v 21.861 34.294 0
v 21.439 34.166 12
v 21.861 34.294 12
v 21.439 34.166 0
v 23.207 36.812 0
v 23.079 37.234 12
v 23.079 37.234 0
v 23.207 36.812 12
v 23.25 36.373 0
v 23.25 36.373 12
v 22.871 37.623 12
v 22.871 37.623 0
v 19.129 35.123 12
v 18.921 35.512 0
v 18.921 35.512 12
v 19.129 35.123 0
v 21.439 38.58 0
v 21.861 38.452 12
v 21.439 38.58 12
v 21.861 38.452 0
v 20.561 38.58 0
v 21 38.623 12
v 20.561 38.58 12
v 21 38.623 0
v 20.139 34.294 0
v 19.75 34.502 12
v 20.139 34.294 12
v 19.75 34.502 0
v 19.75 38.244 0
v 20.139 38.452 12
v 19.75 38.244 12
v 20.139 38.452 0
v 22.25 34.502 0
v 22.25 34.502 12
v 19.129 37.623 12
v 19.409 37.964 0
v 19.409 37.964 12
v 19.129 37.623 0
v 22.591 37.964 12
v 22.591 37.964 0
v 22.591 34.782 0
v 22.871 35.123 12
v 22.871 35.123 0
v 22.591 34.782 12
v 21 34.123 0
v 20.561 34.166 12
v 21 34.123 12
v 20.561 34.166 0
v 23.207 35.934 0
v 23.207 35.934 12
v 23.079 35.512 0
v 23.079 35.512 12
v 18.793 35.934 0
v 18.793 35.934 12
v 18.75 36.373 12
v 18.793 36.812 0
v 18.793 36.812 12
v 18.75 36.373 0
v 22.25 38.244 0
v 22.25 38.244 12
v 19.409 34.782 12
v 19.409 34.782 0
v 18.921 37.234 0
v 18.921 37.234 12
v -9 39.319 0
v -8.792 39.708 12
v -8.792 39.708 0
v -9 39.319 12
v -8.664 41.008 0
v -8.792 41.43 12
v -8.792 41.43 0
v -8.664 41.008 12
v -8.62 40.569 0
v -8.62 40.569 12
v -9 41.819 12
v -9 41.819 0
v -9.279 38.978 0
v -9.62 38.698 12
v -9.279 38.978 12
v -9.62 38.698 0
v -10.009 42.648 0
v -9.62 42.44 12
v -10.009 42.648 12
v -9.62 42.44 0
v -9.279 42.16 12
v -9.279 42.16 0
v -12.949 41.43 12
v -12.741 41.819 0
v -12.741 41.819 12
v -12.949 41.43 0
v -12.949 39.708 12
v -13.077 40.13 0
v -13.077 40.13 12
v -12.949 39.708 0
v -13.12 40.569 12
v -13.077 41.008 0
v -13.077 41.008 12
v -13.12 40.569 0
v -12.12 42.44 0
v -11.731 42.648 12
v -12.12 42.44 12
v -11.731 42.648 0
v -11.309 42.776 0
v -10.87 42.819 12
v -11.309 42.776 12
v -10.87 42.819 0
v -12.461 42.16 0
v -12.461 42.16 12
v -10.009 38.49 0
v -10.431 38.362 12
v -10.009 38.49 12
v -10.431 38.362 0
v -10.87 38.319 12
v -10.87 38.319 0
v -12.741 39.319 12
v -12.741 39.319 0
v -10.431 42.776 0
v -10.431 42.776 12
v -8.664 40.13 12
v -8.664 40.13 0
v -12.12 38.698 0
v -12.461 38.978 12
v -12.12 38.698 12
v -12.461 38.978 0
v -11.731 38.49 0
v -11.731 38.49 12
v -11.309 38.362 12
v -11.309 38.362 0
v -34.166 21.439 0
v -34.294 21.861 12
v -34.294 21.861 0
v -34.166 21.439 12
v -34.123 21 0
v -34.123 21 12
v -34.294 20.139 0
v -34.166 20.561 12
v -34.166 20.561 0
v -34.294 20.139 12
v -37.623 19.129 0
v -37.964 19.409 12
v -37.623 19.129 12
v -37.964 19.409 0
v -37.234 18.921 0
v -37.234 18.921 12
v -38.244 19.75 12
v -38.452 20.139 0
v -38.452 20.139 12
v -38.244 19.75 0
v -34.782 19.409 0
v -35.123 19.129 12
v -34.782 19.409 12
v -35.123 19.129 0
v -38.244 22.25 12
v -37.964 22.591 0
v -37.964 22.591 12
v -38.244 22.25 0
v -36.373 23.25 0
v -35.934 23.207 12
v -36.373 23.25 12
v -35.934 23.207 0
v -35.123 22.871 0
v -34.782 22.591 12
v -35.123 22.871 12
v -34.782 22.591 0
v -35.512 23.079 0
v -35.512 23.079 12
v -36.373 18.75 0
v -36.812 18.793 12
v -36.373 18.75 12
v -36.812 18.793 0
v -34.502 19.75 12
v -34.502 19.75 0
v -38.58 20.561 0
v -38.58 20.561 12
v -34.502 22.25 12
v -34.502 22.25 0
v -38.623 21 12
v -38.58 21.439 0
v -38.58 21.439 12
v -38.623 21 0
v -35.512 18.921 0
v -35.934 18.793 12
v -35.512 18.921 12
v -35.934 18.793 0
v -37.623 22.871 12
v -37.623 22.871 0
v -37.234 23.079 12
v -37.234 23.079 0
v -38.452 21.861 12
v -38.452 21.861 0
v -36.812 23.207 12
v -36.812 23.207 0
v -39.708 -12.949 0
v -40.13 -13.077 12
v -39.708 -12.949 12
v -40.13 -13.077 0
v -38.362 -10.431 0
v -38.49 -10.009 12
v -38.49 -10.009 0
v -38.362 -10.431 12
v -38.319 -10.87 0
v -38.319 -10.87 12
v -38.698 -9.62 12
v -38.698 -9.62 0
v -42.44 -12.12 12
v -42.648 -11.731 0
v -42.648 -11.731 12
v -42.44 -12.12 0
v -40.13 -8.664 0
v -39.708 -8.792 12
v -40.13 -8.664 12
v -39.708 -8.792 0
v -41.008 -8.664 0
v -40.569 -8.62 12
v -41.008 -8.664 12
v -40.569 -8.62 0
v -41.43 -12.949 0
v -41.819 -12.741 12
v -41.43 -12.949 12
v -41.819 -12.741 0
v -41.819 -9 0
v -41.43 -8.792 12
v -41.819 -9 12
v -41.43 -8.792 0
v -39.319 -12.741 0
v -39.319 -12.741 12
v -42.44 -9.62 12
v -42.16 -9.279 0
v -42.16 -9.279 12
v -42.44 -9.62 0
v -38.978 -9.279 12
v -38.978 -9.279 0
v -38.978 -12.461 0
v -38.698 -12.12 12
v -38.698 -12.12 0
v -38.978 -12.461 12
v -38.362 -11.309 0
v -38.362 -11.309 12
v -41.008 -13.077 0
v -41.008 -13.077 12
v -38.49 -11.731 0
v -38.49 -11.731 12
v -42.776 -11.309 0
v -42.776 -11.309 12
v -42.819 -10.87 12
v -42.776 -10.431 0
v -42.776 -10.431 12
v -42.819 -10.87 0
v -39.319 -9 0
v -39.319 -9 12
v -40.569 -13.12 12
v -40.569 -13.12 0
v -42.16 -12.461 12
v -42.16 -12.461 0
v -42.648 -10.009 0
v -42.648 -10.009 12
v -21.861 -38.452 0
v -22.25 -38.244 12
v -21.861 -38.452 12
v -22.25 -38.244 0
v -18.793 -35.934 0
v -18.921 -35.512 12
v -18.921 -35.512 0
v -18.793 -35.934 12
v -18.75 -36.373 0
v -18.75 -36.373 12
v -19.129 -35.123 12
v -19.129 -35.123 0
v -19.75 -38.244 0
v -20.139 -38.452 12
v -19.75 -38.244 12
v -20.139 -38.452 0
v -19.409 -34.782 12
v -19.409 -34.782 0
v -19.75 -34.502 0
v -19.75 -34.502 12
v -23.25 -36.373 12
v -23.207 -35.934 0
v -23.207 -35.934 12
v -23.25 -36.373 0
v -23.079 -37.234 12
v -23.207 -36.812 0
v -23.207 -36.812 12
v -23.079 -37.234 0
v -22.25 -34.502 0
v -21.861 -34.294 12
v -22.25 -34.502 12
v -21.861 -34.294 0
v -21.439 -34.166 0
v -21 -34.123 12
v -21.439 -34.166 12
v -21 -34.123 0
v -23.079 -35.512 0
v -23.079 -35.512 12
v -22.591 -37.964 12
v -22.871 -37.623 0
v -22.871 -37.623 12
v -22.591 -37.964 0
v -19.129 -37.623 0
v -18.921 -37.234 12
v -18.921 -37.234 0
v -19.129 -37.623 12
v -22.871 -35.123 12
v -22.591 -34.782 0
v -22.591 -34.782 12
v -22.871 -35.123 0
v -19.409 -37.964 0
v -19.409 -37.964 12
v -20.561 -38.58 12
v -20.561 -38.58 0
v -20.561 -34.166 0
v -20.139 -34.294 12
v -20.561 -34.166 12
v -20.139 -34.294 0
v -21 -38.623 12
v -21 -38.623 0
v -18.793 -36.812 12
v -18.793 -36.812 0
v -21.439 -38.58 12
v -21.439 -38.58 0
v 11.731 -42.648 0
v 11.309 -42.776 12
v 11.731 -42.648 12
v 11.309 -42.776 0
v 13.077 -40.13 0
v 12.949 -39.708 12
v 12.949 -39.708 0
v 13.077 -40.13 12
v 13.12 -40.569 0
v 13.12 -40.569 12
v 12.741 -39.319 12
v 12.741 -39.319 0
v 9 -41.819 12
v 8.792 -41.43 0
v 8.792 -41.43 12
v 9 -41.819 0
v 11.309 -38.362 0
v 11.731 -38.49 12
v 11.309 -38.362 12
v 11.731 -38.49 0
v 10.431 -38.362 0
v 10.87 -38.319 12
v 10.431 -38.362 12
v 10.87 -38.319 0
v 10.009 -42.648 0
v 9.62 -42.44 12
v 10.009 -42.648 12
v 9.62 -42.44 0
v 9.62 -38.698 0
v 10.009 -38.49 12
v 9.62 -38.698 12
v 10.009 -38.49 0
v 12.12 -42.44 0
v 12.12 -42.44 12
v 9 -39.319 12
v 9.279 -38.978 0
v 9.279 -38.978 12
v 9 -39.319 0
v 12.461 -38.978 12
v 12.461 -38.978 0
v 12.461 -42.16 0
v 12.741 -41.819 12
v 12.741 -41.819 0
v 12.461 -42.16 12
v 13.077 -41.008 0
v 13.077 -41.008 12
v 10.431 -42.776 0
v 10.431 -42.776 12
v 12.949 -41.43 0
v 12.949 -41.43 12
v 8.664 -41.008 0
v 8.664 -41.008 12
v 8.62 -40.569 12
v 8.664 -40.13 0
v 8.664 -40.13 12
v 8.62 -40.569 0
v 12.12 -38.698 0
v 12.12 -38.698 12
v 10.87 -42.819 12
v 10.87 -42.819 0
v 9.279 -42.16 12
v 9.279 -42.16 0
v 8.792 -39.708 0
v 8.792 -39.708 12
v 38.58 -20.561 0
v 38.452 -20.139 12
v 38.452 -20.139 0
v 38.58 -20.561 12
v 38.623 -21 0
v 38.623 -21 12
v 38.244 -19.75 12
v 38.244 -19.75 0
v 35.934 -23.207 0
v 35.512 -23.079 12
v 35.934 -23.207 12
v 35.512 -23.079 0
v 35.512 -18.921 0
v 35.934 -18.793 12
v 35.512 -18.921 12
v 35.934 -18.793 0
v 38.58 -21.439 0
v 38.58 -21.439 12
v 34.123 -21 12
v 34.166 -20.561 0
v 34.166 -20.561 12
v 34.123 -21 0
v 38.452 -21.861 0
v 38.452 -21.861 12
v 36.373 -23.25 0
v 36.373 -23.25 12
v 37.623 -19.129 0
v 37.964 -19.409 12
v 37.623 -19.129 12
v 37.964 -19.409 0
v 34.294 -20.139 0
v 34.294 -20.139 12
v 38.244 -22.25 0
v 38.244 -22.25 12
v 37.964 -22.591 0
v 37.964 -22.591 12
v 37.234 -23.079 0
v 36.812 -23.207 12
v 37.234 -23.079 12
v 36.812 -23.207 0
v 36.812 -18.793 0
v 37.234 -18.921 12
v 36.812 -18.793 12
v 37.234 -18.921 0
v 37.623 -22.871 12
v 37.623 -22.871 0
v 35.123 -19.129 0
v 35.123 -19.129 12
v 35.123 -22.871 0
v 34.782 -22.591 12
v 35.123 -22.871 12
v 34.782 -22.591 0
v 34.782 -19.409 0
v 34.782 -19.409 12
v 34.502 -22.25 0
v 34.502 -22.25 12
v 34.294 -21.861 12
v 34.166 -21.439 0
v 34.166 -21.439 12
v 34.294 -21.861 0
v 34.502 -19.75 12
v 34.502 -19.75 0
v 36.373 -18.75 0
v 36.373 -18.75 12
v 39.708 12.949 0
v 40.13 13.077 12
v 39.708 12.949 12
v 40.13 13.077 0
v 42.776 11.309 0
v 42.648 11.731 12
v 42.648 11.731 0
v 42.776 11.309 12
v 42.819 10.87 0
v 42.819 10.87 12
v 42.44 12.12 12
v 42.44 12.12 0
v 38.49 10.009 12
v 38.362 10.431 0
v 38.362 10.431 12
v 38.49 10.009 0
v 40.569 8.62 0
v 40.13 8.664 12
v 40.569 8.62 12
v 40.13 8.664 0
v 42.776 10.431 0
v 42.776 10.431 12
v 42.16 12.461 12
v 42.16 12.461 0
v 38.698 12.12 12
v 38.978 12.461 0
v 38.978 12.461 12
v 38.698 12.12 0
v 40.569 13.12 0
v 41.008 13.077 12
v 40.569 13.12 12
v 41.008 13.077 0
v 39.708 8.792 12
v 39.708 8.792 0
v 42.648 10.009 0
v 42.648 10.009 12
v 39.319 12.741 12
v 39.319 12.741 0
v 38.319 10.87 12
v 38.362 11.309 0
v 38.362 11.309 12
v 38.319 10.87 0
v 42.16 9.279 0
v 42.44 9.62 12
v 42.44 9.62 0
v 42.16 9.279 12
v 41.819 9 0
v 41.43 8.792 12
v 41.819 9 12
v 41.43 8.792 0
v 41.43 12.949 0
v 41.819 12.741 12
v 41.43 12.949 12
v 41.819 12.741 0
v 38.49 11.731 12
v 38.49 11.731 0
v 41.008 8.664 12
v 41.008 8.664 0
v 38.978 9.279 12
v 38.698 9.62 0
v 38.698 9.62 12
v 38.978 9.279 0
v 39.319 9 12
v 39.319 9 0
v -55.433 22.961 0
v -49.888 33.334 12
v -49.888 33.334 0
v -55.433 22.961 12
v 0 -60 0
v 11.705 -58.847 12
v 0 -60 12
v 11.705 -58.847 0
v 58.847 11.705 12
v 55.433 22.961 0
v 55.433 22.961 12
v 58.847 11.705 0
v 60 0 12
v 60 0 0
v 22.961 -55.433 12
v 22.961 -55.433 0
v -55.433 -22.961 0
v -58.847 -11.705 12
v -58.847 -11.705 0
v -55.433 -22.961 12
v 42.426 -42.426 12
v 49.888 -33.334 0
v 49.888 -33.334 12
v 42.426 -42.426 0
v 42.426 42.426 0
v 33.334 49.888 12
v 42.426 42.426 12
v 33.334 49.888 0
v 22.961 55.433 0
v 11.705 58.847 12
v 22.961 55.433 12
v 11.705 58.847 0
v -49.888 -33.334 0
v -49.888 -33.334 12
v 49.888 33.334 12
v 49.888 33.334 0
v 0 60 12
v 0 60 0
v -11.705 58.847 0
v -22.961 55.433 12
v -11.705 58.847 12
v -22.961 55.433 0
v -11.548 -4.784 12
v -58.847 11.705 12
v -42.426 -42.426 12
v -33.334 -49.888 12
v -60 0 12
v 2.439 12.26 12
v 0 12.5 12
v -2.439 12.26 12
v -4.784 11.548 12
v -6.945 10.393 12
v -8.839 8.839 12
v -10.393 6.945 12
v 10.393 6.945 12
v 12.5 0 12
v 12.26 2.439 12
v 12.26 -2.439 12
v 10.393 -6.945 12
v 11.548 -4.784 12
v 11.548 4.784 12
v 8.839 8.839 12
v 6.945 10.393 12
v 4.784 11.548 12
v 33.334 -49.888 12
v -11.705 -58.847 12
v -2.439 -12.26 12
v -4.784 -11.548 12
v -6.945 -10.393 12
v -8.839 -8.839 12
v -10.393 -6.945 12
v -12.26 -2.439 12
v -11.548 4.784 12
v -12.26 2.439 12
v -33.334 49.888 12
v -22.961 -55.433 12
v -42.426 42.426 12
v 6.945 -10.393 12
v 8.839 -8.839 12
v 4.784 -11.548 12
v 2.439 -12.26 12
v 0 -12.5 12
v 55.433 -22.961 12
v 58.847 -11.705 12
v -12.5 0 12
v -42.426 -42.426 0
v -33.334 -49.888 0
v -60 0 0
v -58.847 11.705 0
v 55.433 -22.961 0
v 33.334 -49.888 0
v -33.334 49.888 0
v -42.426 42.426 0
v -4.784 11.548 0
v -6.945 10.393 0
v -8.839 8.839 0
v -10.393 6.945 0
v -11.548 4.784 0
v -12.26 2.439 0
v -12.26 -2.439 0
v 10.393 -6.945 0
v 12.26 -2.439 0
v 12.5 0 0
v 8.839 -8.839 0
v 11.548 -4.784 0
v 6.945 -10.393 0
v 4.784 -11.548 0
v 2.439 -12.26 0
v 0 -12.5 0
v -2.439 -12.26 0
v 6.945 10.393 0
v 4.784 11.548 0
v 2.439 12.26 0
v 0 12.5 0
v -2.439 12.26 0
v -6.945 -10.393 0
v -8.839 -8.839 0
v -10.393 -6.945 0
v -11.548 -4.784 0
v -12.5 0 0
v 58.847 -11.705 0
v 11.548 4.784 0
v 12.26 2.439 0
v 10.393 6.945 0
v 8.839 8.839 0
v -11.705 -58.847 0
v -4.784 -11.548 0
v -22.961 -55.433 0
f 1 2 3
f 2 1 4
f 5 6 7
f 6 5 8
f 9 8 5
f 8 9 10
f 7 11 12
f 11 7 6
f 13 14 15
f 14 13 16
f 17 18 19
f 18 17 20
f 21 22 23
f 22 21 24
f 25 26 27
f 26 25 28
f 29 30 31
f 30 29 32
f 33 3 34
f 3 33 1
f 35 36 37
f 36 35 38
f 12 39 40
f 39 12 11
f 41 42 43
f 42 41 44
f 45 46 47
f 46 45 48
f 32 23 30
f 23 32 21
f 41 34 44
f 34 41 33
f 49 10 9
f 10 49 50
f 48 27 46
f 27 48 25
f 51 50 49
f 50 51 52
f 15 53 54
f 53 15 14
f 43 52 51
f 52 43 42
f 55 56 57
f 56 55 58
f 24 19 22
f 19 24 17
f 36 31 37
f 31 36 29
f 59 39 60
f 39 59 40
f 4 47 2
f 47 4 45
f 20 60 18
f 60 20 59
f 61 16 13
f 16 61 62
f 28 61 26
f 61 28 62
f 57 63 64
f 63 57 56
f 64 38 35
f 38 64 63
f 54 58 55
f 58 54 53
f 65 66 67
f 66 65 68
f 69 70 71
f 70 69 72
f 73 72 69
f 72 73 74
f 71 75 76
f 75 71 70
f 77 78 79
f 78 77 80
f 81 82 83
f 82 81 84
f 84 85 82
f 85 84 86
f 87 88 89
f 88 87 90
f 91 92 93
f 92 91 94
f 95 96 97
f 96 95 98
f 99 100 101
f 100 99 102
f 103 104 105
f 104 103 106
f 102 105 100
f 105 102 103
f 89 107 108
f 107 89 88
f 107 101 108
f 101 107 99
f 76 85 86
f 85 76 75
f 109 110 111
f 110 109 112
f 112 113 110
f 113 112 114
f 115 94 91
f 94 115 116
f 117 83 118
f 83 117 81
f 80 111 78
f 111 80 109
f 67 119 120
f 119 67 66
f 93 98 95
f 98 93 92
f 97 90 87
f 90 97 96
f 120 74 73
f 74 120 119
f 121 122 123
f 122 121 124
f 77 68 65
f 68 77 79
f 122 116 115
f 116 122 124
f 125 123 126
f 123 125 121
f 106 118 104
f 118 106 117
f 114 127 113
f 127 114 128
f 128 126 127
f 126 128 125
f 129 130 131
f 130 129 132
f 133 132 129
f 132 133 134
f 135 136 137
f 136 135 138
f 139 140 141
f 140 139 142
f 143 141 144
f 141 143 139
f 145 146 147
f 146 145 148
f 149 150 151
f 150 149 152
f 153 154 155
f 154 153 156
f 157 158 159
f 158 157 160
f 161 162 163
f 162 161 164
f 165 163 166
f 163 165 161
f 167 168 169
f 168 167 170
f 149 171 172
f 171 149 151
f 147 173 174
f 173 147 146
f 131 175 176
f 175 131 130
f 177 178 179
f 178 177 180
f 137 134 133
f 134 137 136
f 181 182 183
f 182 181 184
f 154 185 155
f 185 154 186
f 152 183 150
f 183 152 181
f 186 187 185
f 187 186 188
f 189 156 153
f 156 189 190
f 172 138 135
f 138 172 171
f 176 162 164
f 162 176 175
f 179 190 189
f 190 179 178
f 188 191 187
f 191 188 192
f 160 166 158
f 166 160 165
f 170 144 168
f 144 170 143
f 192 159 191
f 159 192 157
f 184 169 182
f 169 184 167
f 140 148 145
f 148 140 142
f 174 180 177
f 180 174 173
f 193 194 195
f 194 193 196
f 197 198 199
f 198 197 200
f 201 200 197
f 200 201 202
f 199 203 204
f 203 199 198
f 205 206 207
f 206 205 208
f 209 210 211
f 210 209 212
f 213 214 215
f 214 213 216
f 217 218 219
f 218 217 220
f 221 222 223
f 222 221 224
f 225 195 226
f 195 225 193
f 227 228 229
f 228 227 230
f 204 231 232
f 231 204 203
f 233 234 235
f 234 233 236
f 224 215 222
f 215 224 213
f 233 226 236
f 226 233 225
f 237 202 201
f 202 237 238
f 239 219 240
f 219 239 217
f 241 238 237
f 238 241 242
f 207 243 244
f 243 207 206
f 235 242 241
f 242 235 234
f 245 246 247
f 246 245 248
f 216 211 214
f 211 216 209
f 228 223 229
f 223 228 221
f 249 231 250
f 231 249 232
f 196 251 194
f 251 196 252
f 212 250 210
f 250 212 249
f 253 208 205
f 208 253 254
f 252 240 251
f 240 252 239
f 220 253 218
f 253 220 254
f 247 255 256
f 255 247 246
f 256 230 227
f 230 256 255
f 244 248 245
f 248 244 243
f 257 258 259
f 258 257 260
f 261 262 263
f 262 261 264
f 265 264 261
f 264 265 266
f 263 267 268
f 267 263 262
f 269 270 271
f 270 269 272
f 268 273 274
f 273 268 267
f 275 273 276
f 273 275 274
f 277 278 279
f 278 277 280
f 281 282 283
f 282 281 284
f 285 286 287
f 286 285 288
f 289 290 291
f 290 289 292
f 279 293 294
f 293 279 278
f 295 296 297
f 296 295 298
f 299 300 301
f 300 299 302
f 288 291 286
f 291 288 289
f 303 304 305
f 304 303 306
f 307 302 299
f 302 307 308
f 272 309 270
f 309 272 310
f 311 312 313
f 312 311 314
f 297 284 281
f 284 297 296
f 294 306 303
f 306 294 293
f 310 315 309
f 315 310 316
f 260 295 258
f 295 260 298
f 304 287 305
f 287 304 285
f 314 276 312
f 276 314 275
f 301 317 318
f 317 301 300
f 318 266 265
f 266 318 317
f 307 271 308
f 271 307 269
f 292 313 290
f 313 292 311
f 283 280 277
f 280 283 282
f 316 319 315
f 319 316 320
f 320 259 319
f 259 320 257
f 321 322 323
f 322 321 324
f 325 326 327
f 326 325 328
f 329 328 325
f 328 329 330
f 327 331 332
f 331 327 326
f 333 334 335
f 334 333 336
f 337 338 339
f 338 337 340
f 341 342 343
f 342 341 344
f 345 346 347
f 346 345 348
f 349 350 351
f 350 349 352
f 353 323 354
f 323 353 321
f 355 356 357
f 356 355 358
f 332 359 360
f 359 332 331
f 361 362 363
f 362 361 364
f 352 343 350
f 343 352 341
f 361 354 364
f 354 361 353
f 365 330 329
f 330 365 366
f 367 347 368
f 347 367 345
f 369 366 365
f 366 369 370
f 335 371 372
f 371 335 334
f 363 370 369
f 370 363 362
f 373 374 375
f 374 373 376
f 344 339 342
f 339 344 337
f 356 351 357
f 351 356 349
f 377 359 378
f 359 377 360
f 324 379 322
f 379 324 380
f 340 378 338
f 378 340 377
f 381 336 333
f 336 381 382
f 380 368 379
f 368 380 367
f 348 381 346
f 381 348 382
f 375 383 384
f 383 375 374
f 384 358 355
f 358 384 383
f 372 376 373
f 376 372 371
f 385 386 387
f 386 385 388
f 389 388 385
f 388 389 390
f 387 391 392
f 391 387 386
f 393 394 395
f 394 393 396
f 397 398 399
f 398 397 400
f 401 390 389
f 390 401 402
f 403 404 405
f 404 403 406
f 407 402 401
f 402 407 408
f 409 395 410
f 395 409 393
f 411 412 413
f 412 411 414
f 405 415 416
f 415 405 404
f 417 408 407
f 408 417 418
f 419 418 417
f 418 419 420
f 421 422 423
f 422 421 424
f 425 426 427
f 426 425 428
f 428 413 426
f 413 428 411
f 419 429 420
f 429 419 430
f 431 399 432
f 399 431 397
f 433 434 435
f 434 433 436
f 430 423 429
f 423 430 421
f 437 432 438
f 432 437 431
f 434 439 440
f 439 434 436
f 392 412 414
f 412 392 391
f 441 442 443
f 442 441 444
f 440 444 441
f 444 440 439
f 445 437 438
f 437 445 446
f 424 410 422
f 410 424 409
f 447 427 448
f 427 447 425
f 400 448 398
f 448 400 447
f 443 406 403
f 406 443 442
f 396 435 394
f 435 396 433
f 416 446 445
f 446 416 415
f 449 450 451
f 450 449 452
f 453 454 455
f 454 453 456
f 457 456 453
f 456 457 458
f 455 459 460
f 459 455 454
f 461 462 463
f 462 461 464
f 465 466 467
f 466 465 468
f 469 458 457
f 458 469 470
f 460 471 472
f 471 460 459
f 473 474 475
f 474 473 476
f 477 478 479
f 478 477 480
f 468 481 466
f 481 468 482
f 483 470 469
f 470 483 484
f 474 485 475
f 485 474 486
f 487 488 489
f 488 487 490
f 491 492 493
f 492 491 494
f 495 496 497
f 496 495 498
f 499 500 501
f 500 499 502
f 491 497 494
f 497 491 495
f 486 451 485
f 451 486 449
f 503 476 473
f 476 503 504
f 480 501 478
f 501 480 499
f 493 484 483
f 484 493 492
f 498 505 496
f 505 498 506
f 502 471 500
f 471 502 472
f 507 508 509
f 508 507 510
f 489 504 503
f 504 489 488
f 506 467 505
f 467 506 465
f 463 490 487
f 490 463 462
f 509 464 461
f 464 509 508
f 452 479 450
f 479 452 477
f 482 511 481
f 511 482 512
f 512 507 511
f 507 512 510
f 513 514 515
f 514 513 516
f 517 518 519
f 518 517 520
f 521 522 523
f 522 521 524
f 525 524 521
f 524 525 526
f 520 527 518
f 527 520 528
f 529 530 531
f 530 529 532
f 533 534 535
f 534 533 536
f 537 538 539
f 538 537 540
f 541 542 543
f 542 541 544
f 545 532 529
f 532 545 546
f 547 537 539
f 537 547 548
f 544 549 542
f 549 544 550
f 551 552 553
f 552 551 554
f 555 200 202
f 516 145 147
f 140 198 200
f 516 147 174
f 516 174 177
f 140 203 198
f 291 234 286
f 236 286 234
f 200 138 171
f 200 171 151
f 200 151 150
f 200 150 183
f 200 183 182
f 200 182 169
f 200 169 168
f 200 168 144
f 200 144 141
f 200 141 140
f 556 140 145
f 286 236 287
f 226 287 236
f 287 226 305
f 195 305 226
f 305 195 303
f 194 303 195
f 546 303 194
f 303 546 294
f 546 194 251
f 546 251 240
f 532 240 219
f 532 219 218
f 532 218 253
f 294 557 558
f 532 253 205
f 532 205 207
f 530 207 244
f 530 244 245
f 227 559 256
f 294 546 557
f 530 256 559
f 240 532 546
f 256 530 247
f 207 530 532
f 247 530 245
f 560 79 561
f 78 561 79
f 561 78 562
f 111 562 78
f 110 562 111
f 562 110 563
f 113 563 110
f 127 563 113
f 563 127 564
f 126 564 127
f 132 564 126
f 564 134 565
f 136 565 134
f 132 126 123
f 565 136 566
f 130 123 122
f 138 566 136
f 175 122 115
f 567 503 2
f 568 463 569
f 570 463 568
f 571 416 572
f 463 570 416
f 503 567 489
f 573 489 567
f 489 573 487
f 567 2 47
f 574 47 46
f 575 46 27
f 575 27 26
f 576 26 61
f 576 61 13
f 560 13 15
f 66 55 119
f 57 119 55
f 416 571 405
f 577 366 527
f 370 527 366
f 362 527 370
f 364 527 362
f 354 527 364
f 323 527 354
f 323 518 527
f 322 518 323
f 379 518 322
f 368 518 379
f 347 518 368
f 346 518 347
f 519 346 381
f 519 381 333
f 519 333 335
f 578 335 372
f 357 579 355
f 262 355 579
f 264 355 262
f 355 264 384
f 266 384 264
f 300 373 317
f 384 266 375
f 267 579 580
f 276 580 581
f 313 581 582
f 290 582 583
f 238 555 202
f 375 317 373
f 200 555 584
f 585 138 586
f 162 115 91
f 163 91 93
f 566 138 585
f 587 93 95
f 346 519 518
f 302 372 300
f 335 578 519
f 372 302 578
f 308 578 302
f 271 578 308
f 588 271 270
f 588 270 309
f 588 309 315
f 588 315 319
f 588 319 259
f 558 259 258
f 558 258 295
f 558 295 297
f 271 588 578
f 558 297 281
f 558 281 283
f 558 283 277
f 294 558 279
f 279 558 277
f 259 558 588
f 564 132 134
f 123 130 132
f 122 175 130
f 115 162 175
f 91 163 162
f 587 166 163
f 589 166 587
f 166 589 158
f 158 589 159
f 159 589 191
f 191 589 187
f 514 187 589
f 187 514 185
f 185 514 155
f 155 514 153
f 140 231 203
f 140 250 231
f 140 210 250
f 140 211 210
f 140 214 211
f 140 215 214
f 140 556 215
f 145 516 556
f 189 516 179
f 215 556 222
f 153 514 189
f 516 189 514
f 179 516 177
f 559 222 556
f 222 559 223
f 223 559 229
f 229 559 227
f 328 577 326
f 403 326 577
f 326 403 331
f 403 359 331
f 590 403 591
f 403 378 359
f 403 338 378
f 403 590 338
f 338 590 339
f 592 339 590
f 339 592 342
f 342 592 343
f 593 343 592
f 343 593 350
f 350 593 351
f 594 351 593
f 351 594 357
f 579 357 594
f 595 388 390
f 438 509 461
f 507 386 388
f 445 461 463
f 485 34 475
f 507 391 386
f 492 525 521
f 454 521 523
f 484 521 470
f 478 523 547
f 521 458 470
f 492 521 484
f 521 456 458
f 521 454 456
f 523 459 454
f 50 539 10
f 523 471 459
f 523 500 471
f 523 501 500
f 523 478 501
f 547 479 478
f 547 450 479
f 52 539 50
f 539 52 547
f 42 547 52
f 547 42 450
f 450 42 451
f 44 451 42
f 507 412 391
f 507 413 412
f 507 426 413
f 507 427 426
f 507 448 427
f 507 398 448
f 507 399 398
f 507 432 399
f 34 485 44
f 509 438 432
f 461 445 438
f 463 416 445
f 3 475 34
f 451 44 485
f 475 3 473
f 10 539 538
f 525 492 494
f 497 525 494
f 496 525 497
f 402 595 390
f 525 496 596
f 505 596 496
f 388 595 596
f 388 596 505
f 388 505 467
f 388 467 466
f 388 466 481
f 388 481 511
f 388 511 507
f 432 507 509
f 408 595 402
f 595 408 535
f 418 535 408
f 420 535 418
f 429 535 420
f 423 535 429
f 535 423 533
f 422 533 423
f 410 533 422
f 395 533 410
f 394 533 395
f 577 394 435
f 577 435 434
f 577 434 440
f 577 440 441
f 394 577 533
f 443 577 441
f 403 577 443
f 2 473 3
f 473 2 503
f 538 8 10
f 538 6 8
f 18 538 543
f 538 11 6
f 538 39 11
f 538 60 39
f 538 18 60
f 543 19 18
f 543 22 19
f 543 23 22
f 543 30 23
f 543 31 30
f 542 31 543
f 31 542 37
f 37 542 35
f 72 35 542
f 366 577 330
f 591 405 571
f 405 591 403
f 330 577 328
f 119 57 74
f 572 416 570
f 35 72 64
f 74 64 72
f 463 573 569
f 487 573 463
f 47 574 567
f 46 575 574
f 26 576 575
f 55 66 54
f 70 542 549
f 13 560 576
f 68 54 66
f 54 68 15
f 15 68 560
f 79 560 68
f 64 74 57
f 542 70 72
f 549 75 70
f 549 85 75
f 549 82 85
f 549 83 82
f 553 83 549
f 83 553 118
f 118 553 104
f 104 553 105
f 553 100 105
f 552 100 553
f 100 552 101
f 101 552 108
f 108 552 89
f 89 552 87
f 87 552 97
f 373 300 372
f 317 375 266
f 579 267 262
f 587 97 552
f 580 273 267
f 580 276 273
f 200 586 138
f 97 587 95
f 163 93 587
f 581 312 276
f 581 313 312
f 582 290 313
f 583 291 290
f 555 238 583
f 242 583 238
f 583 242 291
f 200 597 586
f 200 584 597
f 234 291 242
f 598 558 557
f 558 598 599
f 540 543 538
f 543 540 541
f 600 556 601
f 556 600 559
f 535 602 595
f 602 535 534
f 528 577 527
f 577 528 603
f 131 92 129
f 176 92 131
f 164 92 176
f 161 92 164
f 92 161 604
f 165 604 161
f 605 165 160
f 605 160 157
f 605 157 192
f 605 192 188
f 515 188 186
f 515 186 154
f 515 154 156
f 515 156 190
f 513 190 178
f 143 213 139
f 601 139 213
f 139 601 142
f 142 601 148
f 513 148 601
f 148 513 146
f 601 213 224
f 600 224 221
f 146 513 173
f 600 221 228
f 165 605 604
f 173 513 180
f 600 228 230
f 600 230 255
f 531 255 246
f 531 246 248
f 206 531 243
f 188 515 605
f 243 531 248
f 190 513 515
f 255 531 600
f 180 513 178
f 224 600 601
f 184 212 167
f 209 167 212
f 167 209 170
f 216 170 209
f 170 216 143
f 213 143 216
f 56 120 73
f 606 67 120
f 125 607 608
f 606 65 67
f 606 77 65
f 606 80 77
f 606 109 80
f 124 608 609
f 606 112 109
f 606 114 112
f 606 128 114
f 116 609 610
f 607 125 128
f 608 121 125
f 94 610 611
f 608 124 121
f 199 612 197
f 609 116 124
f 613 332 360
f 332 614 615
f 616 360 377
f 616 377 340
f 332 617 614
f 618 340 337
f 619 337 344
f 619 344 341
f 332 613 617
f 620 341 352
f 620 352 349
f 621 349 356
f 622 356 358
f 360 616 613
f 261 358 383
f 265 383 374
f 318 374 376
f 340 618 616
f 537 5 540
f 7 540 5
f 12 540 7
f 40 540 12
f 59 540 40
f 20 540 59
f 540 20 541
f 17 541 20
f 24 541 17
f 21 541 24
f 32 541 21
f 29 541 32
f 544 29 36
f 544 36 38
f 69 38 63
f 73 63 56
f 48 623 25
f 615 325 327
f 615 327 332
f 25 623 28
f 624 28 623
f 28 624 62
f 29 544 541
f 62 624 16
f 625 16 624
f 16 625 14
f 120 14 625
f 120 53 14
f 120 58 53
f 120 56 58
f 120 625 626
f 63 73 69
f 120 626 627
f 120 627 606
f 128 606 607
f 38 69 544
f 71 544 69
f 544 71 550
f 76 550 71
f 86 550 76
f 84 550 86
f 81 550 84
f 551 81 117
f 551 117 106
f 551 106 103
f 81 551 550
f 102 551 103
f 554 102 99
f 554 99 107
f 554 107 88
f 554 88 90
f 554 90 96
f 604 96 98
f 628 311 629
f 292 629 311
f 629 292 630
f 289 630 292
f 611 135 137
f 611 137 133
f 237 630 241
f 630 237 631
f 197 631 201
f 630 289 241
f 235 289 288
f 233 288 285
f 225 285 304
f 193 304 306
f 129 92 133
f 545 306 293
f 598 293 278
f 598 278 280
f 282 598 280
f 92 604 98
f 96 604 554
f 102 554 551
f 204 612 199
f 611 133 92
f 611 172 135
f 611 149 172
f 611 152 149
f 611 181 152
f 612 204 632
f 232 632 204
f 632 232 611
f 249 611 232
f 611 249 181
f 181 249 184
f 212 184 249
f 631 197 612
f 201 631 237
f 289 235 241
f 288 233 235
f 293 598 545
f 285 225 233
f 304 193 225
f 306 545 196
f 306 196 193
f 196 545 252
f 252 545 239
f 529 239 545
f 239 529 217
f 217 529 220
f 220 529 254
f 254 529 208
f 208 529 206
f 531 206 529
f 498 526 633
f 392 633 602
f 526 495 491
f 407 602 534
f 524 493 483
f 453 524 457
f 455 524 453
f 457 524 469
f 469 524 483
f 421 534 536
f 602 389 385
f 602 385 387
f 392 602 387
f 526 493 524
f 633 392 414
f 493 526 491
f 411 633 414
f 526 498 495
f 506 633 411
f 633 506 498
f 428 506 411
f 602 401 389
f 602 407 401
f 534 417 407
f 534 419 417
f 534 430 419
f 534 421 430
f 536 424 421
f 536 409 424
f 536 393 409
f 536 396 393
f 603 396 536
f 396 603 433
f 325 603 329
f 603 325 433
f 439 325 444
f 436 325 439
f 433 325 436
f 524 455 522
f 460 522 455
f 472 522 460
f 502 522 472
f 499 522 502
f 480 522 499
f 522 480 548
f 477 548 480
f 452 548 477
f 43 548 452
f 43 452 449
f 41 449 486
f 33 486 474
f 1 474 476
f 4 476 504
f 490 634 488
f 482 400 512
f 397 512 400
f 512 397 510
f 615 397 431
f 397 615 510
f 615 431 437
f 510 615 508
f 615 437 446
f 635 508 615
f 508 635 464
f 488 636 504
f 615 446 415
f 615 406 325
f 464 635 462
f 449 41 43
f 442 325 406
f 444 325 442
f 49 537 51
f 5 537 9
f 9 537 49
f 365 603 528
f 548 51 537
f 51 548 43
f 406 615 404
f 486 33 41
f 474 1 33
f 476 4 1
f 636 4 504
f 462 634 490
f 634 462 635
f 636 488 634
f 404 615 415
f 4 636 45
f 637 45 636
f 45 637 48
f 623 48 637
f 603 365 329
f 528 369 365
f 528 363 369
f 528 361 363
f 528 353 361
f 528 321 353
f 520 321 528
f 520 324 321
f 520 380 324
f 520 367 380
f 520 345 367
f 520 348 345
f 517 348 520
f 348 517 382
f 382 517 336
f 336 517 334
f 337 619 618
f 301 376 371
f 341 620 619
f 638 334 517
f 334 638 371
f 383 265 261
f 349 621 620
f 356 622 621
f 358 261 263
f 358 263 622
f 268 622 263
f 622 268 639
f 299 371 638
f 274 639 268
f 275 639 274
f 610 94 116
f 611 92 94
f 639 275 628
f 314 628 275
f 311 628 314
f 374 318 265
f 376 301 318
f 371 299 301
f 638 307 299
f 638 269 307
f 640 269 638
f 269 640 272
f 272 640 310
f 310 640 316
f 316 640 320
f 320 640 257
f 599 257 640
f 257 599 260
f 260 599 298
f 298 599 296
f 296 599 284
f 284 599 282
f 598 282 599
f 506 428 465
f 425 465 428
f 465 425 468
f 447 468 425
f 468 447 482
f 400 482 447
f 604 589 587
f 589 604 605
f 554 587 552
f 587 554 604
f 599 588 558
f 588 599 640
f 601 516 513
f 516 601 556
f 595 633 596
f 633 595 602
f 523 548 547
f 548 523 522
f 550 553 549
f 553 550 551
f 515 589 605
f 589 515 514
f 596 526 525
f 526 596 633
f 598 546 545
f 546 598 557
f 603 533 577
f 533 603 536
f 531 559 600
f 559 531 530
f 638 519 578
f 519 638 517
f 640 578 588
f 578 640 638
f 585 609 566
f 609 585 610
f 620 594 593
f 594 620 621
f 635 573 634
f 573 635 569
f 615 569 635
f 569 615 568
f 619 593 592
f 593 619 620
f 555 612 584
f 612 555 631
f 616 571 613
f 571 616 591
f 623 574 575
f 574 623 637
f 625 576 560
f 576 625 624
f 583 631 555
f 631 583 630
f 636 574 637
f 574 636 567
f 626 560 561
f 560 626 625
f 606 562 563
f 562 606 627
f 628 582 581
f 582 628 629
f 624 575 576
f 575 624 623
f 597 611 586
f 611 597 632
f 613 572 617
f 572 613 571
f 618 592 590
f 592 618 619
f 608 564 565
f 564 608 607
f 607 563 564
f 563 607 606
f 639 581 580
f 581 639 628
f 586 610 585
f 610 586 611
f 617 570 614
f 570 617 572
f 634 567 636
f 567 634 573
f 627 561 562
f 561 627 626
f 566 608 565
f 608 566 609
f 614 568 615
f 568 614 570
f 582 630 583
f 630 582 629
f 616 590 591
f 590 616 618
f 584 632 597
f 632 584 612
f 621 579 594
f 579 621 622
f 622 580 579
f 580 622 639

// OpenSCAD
$fn = 32;

// ----------------------------------------------------------------------
// Flange Ø120 x 12
// 8 holes on a Ø84 bolt circle, bolted joints
// ----------------------------------------------------------------------

// --- parameters (mm) ---
flange_d = 120;  // outside diameter of the flange
thickness = 12;  // flange thickness
holes = 8;       // number of bolt holes
pcd = 84;        // bolt circle diameter
start_deg = 60;  // angle of the first hole, from +X
hole_d = 4.5;    // bolt hole diameter
bore_d = 25;     // central through bore
hub_d = 33;      // hub outside diameter
hub_h = 0;       // hub height above the flange face (0 = no hub)

// --- derived feature positions (mm) ---
height = thickness + hub_h;  // = 12   overall height of the part
pcd_r = pcd / 2;             // = 42   bolt circle radius
hole_step = 360 / holes;     // = 45   angular pitch
feature_centers = [
  [pcd_r * cos(start_deg + 0 * hole_step), pcd_r * sin(start_deg + 0 * hole_step)],
  [pcd_r * cos(start_deg + 1 * hole_step), pcd_r * sin(start_deg + 1 * hole_step)],
  [pcd_r * cos(start_deg + 2 * hole_step), pcd_r * sin(start_deg + 2 * hole_step)],
  [pcd_r * cos(start_deg + 3 * hole_step), pcd_r * sin(start_deg + 3 * hole_step)],
  [pcd_r * cos(start_deg + 4 * hole_step), pcd_r * sin(start_deg + 4 * hole_step)],
  [pcd_r * cos(start_deg + 5 * hole_step), pcd_r * sin(start_deg + 5 * hole_step)],
  [pcd_r * cos(start_deg + 6 * hole_step), pcd_r * sin(start_deg + 6 * hole_step)],
  [pcd_r * cos(start_deg + 7 * hole_step), pcd_r * sin(start_deg + 7 * hole_step)]
];   // bolt hole centres on the pitch circle

// flange disc, every hole and the bore cut straight through
difference() {
  union() {
    cylinder(d = flange_d, h = thickness);
  }
  translate([0, 0, -1]) cylinder(d = bore_d, h = height + 2);  // bore, through
  for (centre = feature_centers)
    translate([centre[0], centre[1], -1]) cylinder(d = hole_d, h = thickness + 2);
}
